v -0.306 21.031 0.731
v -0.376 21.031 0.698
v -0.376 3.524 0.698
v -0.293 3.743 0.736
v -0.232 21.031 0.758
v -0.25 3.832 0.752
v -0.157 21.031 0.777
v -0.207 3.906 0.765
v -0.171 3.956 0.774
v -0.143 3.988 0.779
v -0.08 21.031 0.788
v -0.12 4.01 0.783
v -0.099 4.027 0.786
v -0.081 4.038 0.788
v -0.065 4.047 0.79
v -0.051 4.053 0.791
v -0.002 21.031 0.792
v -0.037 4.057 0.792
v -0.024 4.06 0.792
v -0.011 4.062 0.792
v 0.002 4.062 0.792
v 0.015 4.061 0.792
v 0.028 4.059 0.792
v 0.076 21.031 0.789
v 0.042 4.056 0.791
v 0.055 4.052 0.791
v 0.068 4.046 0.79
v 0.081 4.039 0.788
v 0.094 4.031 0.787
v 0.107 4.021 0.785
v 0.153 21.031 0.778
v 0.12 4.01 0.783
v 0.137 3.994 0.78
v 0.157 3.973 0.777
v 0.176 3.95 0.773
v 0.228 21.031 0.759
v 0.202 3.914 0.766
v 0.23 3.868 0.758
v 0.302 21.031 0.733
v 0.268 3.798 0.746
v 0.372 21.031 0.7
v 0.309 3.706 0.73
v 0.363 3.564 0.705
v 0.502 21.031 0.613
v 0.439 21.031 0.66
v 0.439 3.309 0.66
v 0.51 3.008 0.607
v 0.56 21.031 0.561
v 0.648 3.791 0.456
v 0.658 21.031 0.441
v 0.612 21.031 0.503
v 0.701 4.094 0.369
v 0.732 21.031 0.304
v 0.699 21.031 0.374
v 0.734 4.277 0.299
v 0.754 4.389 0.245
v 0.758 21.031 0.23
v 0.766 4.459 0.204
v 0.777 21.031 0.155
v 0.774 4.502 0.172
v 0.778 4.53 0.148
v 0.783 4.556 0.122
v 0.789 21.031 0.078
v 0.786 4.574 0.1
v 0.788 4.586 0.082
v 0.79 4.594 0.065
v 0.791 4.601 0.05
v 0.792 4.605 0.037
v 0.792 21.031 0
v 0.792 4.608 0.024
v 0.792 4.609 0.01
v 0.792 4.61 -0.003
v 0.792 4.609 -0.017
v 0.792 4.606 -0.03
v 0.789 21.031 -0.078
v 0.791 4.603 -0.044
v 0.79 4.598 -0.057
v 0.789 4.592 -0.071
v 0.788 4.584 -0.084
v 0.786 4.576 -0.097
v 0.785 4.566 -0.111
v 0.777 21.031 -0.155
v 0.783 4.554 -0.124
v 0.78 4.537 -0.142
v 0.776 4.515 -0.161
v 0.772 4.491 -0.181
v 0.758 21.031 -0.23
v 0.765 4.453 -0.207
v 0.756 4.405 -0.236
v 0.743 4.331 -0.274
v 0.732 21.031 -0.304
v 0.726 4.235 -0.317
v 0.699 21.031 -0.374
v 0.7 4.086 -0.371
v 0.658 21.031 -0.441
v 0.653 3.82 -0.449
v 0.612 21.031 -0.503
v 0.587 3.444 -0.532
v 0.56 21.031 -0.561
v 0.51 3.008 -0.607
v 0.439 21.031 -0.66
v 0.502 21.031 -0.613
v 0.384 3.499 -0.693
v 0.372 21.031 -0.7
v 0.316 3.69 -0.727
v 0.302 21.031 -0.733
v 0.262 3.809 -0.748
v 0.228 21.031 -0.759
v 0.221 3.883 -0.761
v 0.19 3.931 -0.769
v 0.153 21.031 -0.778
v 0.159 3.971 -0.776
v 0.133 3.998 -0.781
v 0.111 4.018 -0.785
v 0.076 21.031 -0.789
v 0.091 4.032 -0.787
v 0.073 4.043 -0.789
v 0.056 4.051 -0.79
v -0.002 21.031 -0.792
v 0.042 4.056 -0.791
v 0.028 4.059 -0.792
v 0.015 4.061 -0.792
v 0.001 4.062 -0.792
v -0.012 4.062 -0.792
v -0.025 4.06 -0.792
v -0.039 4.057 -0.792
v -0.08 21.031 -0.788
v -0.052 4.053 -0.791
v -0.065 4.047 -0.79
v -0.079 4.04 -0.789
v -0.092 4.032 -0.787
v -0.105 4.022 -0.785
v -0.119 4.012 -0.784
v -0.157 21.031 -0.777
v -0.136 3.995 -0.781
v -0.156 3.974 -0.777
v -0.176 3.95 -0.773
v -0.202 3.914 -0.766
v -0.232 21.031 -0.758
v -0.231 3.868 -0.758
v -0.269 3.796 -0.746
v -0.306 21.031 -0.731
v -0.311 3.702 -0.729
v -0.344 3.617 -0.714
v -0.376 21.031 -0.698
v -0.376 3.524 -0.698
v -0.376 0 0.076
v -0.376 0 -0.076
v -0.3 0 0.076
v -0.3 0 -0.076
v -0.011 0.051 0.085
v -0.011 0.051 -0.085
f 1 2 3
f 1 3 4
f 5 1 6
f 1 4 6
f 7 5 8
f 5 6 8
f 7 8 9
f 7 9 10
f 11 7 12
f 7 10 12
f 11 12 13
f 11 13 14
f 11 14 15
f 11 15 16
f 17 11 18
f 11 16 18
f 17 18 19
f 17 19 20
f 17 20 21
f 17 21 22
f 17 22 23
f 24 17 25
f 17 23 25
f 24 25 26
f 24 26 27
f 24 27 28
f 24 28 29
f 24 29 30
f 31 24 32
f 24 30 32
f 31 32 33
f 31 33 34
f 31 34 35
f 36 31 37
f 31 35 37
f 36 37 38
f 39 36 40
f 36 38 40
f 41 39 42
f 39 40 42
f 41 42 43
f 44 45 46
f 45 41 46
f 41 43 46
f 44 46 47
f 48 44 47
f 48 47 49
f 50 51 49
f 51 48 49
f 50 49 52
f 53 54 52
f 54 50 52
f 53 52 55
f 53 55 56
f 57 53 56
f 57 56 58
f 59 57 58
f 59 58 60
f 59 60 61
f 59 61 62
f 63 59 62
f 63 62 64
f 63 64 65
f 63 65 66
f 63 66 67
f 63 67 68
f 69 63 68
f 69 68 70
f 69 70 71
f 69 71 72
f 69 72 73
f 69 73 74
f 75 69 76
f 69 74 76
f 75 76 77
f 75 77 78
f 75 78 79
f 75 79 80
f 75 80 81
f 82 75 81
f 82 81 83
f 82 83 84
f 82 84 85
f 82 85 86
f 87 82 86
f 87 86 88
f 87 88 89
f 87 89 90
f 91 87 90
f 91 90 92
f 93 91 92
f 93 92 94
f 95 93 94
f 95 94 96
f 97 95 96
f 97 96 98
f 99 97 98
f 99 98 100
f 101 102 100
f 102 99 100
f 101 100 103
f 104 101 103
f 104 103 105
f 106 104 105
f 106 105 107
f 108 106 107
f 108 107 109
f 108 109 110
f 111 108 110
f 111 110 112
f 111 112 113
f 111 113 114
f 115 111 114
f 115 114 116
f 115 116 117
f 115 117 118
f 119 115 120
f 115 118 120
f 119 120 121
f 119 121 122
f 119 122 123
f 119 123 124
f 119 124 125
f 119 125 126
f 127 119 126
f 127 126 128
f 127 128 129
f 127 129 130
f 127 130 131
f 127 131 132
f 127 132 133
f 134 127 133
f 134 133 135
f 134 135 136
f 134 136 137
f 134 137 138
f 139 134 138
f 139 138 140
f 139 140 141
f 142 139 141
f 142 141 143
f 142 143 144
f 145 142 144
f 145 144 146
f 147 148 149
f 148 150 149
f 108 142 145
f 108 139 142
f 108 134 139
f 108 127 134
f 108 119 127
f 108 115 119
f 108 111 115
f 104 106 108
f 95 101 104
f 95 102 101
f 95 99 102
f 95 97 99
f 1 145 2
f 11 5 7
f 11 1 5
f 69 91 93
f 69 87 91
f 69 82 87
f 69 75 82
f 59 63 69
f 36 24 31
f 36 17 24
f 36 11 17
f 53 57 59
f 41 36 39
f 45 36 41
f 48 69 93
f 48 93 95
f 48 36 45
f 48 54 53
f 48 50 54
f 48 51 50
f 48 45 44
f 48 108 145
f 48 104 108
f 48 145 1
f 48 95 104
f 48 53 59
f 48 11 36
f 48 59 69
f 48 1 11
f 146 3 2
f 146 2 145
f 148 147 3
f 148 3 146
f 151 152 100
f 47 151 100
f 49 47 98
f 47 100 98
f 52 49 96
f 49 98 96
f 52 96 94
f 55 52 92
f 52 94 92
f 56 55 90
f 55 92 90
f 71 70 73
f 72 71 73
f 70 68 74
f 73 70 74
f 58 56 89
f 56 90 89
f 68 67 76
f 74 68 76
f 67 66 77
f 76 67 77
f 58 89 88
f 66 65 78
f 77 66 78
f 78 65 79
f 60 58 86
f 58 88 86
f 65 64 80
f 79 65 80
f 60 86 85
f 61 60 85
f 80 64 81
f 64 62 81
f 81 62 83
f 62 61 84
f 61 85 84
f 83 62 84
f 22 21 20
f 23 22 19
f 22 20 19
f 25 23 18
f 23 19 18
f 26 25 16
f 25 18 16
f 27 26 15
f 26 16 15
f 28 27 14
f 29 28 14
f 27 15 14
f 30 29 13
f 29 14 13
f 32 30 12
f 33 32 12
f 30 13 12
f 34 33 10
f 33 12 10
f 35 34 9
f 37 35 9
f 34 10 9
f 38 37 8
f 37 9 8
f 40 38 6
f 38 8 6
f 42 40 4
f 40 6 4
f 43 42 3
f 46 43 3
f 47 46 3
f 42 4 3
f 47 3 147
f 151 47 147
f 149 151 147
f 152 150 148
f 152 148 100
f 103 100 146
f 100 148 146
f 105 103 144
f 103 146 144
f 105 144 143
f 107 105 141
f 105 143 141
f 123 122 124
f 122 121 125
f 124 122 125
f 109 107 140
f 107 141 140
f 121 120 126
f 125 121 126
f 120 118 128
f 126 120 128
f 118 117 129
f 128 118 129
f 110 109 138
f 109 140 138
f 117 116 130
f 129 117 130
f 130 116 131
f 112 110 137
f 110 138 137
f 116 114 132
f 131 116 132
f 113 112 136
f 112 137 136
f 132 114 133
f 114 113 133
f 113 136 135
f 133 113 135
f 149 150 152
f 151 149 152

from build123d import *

# Parameters (mm, degrees)
TD_SKETCH_R                   = 0.79248
TL_FEATURE_DEPTH              = 21.0312
TDF_STD_SKETCH_W              = 1.60495996
TDF_STD_SKETCH_H              = 1.60495996
TDF_STD_FEATURE_DEPTH         = 22.061040395
ISA_20_STD_FEATURE_DEPTH      = 22.061040395
ISA_20_STD_FEATURE_DEPTH_BACK = 22.061040395
F_10BA_STD_FEATURE_DEPTH      = 22.061040395
F_10BA_STD_FEATURE_DEPTH_BACK = 22.061040395


with BuildPart() as part:
    # TD_sketch → TL_feature (new body)
    with BuildSketch(Plane(origin=(0, 0, 0), x_dir=(1, 0, 0), z_dir=(0, 1, 0))):
        Circle(TD_SKETCH_R)
    extrude(amount=TL_FEATURE_DEPTH)

    # TDF_STD_sketch → TDF_STD_feature (cut, through all)
    with BuildSketch(Plane(origin=(0, 0, 0), x_dir=(1, 0, 0), z_dir=(0, 1, 0))):
        with Locations((-1.17839998, 0)):
            Rectangle(TDF_STD_SKETCH_W, TDF_STD_SKETCH_H)
    extrude(amount=TDF_STD_FEATURE_DEPTH, mode=Mode.SUBTRACT)

    # ISA_20_STD_sketch → ISA_20_STD_feature (cut, two sides: drawn at the far end of the back side and taken through both)
    with BuildSketch(Plane(origin=(0, 0, 0), x_dir=(0, 0, -1), z_dir=(1, 0, 0)).offset(-ISA_20_STD_FEATURE_DEPTH_BACK)):
        Polygon((-12.996080373, 73.27228267), (-3.784567997, 21.0312), (-0.0762, 0), (0.0762, 0), (3.784567997, 21.0312), (12.996080373, 73.27228267), (12.996080373, -32.821688483), (-12.996080373, -32.821688483), align=None)
    extrude(amount=ISA_20_STD_FEATURE_DEPTH + ISA_20_STD_FEATURE_DEPTH_BACK, mode=Mode.SUBTRACT)

    # 10BA_STD_sketch → 10BA_STD_feature (cut, two sides: drawn at the far end of the back side and taken through both)
    with BuildSketch(Plane.XY.offset(-F_10BA_STD_FEATURE_DEPTH_BACK)):
        Polygon((-53.216424634, 0), (-0.37592, 0), (-0.29972, 0), (-0.011354365, 0.050846642), (3.688047997, 21.0312), (12.863705333, 73.068938636), (91.245889802, 2.18375769), (25.165759835, -70.885180946), align=None)
    extrude(amount=F_10BA_STD_FEATURE_DEPTH + F_10BA_STD_FEATURE_DEPTH_BACK, mode=Mode.SUBTRACT)


solid = part.part
